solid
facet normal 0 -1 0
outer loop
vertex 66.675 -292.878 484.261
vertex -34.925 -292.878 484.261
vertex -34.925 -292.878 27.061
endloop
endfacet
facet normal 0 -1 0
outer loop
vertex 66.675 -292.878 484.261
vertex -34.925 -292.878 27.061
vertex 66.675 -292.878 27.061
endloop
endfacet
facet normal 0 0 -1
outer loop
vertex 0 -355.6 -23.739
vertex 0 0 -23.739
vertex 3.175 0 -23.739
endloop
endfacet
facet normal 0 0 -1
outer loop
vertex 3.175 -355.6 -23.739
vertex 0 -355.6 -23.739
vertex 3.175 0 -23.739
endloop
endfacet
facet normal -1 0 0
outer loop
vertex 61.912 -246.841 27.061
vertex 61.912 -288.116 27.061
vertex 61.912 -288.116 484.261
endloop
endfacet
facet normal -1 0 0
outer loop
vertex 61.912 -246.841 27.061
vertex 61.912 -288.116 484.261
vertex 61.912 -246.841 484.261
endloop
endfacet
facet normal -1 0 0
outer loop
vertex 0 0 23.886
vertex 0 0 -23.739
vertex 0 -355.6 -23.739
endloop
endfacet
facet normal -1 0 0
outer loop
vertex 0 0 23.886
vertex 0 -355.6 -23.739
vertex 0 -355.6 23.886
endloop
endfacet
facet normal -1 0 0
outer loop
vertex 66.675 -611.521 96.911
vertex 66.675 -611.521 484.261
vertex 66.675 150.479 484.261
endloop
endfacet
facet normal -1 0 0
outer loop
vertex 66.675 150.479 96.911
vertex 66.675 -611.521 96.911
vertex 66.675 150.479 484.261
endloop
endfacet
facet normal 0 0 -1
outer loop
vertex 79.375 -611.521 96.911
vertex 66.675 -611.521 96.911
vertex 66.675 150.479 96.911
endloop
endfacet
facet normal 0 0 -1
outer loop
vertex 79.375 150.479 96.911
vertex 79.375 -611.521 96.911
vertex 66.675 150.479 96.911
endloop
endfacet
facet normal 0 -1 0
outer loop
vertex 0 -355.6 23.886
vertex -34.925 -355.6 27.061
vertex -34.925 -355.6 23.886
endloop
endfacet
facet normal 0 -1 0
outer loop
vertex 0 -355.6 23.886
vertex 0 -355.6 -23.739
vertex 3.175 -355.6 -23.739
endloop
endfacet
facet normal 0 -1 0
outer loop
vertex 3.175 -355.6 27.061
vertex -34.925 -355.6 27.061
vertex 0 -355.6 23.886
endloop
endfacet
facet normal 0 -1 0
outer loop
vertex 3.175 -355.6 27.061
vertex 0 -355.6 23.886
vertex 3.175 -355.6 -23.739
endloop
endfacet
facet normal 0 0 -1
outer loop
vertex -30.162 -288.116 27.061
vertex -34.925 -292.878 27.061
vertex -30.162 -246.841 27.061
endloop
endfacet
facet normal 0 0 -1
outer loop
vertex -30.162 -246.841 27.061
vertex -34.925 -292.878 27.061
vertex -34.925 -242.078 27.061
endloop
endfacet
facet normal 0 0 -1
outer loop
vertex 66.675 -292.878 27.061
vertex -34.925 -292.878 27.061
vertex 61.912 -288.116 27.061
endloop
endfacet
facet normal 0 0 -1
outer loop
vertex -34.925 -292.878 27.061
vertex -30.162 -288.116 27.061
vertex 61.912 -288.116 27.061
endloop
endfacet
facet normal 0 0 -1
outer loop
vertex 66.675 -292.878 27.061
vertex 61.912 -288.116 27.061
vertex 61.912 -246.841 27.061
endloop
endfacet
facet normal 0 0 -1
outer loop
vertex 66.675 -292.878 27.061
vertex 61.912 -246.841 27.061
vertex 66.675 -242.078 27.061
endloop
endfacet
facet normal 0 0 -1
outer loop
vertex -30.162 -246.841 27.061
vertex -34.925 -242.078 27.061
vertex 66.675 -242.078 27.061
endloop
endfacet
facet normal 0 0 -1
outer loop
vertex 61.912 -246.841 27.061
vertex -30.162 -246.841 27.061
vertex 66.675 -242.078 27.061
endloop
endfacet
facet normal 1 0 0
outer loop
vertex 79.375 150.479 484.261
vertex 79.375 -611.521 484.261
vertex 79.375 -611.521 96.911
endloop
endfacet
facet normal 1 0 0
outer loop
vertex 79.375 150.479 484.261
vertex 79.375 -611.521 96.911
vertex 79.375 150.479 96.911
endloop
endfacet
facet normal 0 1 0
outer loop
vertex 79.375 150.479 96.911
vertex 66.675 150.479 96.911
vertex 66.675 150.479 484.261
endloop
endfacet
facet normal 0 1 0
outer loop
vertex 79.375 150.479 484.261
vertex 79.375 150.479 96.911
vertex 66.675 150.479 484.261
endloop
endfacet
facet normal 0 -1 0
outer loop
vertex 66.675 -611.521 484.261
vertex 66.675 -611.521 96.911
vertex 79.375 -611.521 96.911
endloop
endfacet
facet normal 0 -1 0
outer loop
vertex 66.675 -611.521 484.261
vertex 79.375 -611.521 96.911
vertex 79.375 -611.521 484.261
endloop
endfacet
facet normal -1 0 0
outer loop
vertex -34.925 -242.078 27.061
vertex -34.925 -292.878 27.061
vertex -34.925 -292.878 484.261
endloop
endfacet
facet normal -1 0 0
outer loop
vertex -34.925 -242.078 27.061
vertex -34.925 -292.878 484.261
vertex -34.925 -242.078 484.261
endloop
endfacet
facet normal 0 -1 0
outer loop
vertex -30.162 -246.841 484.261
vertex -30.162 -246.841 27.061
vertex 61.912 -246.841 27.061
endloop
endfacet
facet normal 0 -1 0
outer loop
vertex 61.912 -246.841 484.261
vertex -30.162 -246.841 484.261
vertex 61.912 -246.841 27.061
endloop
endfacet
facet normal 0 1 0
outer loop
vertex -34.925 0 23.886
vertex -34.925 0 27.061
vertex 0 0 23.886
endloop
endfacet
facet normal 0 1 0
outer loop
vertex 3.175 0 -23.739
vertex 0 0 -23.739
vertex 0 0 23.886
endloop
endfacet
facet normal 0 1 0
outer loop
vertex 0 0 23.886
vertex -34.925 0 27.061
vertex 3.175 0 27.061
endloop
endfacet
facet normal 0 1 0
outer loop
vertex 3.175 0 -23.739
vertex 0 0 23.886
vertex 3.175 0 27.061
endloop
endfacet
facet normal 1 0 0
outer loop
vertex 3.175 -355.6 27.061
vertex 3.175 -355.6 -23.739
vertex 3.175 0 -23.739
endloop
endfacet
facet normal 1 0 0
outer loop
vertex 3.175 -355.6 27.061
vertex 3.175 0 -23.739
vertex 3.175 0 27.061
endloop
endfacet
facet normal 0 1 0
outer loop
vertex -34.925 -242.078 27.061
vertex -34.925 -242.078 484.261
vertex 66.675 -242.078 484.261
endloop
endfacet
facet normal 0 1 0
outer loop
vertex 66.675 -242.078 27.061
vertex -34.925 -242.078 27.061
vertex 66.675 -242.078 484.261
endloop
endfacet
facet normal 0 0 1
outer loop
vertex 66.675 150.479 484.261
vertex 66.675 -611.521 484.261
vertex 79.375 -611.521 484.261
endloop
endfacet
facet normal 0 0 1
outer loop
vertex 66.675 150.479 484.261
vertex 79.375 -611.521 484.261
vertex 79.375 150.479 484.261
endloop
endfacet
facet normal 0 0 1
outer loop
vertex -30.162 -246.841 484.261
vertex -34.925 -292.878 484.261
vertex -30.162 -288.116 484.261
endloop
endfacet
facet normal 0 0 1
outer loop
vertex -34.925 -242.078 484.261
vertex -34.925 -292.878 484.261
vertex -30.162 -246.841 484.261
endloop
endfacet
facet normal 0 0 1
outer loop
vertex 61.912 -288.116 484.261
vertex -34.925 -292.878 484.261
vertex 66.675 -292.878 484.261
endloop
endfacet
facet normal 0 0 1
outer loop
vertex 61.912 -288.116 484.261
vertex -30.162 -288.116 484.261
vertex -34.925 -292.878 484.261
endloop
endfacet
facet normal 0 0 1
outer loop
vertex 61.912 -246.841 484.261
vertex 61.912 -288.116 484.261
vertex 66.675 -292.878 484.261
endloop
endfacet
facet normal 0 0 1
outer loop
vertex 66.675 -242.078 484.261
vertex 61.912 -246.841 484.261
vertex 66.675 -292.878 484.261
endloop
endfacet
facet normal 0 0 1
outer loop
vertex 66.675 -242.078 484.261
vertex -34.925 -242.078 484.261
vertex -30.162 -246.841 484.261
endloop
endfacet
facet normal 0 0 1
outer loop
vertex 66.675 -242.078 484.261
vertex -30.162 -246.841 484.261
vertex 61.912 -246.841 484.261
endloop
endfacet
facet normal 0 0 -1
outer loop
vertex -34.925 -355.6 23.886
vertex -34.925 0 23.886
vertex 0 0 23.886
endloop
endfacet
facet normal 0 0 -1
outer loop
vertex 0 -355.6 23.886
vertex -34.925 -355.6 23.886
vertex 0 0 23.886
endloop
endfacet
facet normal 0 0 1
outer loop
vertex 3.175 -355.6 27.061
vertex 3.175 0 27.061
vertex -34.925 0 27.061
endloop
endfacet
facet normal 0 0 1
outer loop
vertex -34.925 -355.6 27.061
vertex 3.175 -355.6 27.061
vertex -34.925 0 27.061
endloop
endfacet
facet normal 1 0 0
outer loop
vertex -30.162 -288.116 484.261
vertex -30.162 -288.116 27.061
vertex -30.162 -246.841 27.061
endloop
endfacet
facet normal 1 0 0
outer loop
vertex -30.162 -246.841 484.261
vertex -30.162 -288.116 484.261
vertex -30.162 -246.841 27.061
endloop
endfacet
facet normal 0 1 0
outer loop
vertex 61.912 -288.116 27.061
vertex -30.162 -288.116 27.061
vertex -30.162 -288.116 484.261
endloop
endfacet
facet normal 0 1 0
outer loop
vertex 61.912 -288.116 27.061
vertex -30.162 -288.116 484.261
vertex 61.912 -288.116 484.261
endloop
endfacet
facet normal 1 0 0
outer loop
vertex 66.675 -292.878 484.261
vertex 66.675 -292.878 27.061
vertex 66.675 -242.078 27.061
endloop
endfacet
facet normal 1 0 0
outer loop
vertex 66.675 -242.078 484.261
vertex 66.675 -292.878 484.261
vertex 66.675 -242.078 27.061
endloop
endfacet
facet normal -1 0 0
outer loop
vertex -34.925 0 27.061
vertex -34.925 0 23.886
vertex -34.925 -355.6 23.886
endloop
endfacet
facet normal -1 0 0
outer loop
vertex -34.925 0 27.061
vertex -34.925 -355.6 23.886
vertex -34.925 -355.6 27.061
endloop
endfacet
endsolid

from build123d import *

# Parameters (mm, degrees)
F0_W     = 34.925
F0_H     = 3.175
F0_W_2   = 3.175
F0_H_2   = 47.625
F1_DEPTH = 355.6
F2_W     = 101.6
F2_H     = 50.8
F2_W_2   = 92.075
F2_H_2   = 41.275
F3_DEPTH = 457.2
F4_W     = 762
F4_H     = 387.35
F5_DEPTH = 12.7


with BuildPart() as f1:
    # F0 (on Front) → F1 (new body)
    with BuildSketch(Plane.XZ):
        with Locations((-17.4625, 25.473452)):
            Rectangle(F0_W, F0_H)
        with Locations((1.5875, 25.473452)):
            Rectangle(F0_W_2, F0_H)
        with Locations((1.5875, 0.073452)):
            Rectangle(F0_W_2, F0_H_2)
    extrude(amount=F1_DEPTH)


with BuildPart() as f3:
    # F2 (on face) → F3 (new body)
    with BuildSketch(Plane.XY.offset(27.060952)):
        with Locations((15.875, -267.47824)):
            Rectangle(F2_W, F2_H)
        with Locations((15.875, -267.47824)):
            Rectangle(F2_W_2, F2_H_2, mode=Mode.SUBTRACT)
    extrude(amount=F3_DEPTH)


with BuildPart() as f5:
    # F4 (on face) → F5 (new body)
    with BuildSketch(Plane.YZ.offset(66.675)):
        with Locations((-230.520756, 290.585952)):
            Rectangle(F4_W, F4_H)
    extrude(amount=F5_DEPTH)


solid = Compound([f1.part, f3.part, f5.part])
